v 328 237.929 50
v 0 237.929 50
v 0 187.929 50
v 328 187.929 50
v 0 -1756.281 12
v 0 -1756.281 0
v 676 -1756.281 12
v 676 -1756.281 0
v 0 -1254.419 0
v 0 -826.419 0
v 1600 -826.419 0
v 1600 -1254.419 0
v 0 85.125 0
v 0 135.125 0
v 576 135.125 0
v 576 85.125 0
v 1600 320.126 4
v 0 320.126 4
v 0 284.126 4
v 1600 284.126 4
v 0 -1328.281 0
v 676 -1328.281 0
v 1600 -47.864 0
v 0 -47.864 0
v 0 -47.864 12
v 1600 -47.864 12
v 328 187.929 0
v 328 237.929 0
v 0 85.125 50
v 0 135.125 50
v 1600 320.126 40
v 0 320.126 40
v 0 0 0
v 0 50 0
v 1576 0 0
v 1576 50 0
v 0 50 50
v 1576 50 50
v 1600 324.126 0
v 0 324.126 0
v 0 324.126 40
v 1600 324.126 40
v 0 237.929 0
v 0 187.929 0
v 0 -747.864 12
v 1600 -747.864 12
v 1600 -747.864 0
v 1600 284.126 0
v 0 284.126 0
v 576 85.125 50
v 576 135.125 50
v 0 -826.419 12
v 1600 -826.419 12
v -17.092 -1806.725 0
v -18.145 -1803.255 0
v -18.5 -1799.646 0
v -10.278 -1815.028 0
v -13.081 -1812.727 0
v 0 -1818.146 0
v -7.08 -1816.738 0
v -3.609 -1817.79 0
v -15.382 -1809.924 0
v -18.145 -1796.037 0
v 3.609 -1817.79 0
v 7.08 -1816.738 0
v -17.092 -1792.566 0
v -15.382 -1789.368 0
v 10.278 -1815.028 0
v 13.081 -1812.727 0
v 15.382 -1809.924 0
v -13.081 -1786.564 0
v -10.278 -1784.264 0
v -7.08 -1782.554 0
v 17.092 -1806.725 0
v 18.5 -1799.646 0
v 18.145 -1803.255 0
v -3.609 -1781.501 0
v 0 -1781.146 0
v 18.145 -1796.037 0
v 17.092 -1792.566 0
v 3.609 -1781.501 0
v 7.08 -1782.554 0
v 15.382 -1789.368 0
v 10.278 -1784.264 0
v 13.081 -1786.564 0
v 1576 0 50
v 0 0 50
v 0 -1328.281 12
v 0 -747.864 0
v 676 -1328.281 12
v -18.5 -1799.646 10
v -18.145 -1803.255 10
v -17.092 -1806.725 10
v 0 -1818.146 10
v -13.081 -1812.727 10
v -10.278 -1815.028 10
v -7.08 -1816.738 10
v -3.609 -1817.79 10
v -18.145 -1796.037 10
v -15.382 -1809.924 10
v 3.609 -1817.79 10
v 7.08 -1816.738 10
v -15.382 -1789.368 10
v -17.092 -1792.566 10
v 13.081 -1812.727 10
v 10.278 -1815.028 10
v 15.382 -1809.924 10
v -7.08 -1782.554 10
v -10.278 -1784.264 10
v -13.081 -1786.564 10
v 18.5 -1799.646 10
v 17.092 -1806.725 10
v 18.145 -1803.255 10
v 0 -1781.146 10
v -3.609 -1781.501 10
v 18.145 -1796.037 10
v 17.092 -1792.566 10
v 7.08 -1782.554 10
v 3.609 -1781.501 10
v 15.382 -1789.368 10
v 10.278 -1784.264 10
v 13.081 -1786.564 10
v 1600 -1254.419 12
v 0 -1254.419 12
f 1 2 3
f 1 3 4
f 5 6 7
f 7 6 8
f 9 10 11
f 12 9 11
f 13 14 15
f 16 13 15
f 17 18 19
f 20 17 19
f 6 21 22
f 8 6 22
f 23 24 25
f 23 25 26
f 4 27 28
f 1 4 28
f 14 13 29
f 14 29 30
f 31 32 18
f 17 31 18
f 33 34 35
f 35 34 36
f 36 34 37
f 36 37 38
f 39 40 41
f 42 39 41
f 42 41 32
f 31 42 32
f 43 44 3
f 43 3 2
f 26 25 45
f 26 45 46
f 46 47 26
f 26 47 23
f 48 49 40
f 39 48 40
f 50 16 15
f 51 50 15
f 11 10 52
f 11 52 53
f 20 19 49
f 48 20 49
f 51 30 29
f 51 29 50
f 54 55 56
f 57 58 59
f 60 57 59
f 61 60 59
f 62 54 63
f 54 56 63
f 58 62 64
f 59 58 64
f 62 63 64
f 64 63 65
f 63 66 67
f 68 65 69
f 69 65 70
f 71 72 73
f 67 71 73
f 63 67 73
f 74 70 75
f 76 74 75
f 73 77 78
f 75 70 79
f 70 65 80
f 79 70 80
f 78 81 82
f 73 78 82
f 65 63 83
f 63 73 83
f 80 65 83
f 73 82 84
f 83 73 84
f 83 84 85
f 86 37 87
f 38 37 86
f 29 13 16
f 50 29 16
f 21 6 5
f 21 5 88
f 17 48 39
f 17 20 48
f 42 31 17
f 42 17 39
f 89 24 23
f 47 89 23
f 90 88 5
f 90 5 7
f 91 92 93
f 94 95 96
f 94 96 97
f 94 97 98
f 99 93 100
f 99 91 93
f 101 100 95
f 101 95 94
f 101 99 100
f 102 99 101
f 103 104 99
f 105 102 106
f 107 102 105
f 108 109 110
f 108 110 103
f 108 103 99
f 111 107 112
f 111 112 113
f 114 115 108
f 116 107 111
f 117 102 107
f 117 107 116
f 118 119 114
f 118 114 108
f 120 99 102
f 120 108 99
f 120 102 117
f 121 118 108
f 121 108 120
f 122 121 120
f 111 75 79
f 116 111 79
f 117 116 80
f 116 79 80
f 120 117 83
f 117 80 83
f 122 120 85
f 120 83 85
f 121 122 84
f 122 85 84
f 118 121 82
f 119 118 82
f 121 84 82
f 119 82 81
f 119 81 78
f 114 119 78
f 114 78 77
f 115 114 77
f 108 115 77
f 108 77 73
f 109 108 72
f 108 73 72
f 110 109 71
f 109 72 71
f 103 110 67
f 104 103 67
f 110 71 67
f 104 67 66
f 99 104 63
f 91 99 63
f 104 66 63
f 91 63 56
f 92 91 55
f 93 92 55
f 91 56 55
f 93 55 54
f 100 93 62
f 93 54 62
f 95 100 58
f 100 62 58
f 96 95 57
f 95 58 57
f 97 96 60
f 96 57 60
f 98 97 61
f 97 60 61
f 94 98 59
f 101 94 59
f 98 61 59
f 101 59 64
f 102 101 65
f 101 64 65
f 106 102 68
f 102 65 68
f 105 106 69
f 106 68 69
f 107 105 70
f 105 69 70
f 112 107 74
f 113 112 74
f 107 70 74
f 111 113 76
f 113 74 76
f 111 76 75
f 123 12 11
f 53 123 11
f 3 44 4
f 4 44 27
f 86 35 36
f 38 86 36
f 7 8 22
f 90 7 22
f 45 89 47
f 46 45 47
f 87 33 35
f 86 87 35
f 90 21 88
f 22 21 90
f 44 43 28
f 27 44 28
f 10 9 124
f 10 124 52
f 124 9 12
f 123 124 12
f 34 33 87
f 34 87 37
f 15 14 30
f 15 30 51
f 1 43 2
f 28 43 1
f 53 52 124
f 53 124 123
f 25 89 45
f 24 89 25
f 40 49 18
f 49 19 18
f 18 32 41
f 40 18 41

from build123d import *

# Parameters (mm, degrees)
F4_W      = 1576
F4_H      = 50
F5_DEPTH  = 50
F6_W      = 576
F6_H      = 50
F7_DEPTH  = 50
F8_W      = 328
F8_H      = 50
F9_DEPTH  = 50
F10_W     = 1600
F10_H     = 700
F11_DEPTH = 12
F12_W     = 1600
F12_H     = 428
F13_DEPTH = 12
F14_W     = 676
F14_H     = 428
F15_DEPTH = 12
F17_DEPTH = 1600
F18_R     = 18.5
F19_DEPTH = 10


with BuildPart() as f5:
    # F4 (on Top) → F5 (new body)
    with BuildSketch(Plane.XY):
        with Locations((788, 25)):
            Rectangle(F4_W, F4_H)
    extrude(amount=F5_DEPTH)


with BuildPart() as f7:
    # F6 (on Top) → F7 (new body)
    with BuildSketch(Plane.XY):
        with Locations((288, 110.1249895759)):
            Rectangle(F6_W, F6_H)
    extrude(amount=F7_DEPTH)


with BuildPart() as f9:
    # F8 (on Top) → F9 (new body)
    with BuildSketch(Plane.XY):
        with Locations((164, 212.9289425771)):
            Rectangle(F8_W, F8_H)
    extrude(amount=F9_DEPTH)


with BuildPart() as f11:
    # F10 (on Top) → F11 (new body)
    with BuildSketch(Plane.XY):
        with Locations((800, -397.8640609177)):
            Rectangle(F10_W, F10_H)
    extrude(amount=F11_DEPTH)


with BuildPart() as f13:
    # F12 (on Top) → F13 (new body)
    with BuildSketch(Plane.XY):
        with Locations((800, -1040.4186293055)):
            Rectangle(F12_W, F12_H)
    extrude(amount=F13_DEPTH)


with BuildPart() as f15:
    # F14 (on Top) → F15 (new body)
    with BuildSketch(Plane.XY):
        with Locations((338, -1542.2805274396)):
            Rectangle(F14_W, F14_H)
    extrude(amount=F15_DEPTH)


with BuildPart() as f17:
    # F16 (on Right) → F17 (new body)
    with BuildSketch(Plane.YZ):
        Polygon((284.1255764412, 0), (324.1255764412, 0), (324.1255764412, 40), (320.1255764412, 40), (320.1255764412, 4), (284.1255764412, 4), align=None)
    extrude(amount=F17_DEPTH)


with BuildPart() as f19:
    # F18 (on Top) → F19 (new body)
    with BuildSketch(Plane.XY):
        with Locations((0, -1799.645781517)):
            Circle(F18_R)
    extrude(amount=F19_DEPTH)


solid = Compound([f5.part, f7.part, f9.part, f11.part, f13.part, f15.part, f17.part, f19.part])
